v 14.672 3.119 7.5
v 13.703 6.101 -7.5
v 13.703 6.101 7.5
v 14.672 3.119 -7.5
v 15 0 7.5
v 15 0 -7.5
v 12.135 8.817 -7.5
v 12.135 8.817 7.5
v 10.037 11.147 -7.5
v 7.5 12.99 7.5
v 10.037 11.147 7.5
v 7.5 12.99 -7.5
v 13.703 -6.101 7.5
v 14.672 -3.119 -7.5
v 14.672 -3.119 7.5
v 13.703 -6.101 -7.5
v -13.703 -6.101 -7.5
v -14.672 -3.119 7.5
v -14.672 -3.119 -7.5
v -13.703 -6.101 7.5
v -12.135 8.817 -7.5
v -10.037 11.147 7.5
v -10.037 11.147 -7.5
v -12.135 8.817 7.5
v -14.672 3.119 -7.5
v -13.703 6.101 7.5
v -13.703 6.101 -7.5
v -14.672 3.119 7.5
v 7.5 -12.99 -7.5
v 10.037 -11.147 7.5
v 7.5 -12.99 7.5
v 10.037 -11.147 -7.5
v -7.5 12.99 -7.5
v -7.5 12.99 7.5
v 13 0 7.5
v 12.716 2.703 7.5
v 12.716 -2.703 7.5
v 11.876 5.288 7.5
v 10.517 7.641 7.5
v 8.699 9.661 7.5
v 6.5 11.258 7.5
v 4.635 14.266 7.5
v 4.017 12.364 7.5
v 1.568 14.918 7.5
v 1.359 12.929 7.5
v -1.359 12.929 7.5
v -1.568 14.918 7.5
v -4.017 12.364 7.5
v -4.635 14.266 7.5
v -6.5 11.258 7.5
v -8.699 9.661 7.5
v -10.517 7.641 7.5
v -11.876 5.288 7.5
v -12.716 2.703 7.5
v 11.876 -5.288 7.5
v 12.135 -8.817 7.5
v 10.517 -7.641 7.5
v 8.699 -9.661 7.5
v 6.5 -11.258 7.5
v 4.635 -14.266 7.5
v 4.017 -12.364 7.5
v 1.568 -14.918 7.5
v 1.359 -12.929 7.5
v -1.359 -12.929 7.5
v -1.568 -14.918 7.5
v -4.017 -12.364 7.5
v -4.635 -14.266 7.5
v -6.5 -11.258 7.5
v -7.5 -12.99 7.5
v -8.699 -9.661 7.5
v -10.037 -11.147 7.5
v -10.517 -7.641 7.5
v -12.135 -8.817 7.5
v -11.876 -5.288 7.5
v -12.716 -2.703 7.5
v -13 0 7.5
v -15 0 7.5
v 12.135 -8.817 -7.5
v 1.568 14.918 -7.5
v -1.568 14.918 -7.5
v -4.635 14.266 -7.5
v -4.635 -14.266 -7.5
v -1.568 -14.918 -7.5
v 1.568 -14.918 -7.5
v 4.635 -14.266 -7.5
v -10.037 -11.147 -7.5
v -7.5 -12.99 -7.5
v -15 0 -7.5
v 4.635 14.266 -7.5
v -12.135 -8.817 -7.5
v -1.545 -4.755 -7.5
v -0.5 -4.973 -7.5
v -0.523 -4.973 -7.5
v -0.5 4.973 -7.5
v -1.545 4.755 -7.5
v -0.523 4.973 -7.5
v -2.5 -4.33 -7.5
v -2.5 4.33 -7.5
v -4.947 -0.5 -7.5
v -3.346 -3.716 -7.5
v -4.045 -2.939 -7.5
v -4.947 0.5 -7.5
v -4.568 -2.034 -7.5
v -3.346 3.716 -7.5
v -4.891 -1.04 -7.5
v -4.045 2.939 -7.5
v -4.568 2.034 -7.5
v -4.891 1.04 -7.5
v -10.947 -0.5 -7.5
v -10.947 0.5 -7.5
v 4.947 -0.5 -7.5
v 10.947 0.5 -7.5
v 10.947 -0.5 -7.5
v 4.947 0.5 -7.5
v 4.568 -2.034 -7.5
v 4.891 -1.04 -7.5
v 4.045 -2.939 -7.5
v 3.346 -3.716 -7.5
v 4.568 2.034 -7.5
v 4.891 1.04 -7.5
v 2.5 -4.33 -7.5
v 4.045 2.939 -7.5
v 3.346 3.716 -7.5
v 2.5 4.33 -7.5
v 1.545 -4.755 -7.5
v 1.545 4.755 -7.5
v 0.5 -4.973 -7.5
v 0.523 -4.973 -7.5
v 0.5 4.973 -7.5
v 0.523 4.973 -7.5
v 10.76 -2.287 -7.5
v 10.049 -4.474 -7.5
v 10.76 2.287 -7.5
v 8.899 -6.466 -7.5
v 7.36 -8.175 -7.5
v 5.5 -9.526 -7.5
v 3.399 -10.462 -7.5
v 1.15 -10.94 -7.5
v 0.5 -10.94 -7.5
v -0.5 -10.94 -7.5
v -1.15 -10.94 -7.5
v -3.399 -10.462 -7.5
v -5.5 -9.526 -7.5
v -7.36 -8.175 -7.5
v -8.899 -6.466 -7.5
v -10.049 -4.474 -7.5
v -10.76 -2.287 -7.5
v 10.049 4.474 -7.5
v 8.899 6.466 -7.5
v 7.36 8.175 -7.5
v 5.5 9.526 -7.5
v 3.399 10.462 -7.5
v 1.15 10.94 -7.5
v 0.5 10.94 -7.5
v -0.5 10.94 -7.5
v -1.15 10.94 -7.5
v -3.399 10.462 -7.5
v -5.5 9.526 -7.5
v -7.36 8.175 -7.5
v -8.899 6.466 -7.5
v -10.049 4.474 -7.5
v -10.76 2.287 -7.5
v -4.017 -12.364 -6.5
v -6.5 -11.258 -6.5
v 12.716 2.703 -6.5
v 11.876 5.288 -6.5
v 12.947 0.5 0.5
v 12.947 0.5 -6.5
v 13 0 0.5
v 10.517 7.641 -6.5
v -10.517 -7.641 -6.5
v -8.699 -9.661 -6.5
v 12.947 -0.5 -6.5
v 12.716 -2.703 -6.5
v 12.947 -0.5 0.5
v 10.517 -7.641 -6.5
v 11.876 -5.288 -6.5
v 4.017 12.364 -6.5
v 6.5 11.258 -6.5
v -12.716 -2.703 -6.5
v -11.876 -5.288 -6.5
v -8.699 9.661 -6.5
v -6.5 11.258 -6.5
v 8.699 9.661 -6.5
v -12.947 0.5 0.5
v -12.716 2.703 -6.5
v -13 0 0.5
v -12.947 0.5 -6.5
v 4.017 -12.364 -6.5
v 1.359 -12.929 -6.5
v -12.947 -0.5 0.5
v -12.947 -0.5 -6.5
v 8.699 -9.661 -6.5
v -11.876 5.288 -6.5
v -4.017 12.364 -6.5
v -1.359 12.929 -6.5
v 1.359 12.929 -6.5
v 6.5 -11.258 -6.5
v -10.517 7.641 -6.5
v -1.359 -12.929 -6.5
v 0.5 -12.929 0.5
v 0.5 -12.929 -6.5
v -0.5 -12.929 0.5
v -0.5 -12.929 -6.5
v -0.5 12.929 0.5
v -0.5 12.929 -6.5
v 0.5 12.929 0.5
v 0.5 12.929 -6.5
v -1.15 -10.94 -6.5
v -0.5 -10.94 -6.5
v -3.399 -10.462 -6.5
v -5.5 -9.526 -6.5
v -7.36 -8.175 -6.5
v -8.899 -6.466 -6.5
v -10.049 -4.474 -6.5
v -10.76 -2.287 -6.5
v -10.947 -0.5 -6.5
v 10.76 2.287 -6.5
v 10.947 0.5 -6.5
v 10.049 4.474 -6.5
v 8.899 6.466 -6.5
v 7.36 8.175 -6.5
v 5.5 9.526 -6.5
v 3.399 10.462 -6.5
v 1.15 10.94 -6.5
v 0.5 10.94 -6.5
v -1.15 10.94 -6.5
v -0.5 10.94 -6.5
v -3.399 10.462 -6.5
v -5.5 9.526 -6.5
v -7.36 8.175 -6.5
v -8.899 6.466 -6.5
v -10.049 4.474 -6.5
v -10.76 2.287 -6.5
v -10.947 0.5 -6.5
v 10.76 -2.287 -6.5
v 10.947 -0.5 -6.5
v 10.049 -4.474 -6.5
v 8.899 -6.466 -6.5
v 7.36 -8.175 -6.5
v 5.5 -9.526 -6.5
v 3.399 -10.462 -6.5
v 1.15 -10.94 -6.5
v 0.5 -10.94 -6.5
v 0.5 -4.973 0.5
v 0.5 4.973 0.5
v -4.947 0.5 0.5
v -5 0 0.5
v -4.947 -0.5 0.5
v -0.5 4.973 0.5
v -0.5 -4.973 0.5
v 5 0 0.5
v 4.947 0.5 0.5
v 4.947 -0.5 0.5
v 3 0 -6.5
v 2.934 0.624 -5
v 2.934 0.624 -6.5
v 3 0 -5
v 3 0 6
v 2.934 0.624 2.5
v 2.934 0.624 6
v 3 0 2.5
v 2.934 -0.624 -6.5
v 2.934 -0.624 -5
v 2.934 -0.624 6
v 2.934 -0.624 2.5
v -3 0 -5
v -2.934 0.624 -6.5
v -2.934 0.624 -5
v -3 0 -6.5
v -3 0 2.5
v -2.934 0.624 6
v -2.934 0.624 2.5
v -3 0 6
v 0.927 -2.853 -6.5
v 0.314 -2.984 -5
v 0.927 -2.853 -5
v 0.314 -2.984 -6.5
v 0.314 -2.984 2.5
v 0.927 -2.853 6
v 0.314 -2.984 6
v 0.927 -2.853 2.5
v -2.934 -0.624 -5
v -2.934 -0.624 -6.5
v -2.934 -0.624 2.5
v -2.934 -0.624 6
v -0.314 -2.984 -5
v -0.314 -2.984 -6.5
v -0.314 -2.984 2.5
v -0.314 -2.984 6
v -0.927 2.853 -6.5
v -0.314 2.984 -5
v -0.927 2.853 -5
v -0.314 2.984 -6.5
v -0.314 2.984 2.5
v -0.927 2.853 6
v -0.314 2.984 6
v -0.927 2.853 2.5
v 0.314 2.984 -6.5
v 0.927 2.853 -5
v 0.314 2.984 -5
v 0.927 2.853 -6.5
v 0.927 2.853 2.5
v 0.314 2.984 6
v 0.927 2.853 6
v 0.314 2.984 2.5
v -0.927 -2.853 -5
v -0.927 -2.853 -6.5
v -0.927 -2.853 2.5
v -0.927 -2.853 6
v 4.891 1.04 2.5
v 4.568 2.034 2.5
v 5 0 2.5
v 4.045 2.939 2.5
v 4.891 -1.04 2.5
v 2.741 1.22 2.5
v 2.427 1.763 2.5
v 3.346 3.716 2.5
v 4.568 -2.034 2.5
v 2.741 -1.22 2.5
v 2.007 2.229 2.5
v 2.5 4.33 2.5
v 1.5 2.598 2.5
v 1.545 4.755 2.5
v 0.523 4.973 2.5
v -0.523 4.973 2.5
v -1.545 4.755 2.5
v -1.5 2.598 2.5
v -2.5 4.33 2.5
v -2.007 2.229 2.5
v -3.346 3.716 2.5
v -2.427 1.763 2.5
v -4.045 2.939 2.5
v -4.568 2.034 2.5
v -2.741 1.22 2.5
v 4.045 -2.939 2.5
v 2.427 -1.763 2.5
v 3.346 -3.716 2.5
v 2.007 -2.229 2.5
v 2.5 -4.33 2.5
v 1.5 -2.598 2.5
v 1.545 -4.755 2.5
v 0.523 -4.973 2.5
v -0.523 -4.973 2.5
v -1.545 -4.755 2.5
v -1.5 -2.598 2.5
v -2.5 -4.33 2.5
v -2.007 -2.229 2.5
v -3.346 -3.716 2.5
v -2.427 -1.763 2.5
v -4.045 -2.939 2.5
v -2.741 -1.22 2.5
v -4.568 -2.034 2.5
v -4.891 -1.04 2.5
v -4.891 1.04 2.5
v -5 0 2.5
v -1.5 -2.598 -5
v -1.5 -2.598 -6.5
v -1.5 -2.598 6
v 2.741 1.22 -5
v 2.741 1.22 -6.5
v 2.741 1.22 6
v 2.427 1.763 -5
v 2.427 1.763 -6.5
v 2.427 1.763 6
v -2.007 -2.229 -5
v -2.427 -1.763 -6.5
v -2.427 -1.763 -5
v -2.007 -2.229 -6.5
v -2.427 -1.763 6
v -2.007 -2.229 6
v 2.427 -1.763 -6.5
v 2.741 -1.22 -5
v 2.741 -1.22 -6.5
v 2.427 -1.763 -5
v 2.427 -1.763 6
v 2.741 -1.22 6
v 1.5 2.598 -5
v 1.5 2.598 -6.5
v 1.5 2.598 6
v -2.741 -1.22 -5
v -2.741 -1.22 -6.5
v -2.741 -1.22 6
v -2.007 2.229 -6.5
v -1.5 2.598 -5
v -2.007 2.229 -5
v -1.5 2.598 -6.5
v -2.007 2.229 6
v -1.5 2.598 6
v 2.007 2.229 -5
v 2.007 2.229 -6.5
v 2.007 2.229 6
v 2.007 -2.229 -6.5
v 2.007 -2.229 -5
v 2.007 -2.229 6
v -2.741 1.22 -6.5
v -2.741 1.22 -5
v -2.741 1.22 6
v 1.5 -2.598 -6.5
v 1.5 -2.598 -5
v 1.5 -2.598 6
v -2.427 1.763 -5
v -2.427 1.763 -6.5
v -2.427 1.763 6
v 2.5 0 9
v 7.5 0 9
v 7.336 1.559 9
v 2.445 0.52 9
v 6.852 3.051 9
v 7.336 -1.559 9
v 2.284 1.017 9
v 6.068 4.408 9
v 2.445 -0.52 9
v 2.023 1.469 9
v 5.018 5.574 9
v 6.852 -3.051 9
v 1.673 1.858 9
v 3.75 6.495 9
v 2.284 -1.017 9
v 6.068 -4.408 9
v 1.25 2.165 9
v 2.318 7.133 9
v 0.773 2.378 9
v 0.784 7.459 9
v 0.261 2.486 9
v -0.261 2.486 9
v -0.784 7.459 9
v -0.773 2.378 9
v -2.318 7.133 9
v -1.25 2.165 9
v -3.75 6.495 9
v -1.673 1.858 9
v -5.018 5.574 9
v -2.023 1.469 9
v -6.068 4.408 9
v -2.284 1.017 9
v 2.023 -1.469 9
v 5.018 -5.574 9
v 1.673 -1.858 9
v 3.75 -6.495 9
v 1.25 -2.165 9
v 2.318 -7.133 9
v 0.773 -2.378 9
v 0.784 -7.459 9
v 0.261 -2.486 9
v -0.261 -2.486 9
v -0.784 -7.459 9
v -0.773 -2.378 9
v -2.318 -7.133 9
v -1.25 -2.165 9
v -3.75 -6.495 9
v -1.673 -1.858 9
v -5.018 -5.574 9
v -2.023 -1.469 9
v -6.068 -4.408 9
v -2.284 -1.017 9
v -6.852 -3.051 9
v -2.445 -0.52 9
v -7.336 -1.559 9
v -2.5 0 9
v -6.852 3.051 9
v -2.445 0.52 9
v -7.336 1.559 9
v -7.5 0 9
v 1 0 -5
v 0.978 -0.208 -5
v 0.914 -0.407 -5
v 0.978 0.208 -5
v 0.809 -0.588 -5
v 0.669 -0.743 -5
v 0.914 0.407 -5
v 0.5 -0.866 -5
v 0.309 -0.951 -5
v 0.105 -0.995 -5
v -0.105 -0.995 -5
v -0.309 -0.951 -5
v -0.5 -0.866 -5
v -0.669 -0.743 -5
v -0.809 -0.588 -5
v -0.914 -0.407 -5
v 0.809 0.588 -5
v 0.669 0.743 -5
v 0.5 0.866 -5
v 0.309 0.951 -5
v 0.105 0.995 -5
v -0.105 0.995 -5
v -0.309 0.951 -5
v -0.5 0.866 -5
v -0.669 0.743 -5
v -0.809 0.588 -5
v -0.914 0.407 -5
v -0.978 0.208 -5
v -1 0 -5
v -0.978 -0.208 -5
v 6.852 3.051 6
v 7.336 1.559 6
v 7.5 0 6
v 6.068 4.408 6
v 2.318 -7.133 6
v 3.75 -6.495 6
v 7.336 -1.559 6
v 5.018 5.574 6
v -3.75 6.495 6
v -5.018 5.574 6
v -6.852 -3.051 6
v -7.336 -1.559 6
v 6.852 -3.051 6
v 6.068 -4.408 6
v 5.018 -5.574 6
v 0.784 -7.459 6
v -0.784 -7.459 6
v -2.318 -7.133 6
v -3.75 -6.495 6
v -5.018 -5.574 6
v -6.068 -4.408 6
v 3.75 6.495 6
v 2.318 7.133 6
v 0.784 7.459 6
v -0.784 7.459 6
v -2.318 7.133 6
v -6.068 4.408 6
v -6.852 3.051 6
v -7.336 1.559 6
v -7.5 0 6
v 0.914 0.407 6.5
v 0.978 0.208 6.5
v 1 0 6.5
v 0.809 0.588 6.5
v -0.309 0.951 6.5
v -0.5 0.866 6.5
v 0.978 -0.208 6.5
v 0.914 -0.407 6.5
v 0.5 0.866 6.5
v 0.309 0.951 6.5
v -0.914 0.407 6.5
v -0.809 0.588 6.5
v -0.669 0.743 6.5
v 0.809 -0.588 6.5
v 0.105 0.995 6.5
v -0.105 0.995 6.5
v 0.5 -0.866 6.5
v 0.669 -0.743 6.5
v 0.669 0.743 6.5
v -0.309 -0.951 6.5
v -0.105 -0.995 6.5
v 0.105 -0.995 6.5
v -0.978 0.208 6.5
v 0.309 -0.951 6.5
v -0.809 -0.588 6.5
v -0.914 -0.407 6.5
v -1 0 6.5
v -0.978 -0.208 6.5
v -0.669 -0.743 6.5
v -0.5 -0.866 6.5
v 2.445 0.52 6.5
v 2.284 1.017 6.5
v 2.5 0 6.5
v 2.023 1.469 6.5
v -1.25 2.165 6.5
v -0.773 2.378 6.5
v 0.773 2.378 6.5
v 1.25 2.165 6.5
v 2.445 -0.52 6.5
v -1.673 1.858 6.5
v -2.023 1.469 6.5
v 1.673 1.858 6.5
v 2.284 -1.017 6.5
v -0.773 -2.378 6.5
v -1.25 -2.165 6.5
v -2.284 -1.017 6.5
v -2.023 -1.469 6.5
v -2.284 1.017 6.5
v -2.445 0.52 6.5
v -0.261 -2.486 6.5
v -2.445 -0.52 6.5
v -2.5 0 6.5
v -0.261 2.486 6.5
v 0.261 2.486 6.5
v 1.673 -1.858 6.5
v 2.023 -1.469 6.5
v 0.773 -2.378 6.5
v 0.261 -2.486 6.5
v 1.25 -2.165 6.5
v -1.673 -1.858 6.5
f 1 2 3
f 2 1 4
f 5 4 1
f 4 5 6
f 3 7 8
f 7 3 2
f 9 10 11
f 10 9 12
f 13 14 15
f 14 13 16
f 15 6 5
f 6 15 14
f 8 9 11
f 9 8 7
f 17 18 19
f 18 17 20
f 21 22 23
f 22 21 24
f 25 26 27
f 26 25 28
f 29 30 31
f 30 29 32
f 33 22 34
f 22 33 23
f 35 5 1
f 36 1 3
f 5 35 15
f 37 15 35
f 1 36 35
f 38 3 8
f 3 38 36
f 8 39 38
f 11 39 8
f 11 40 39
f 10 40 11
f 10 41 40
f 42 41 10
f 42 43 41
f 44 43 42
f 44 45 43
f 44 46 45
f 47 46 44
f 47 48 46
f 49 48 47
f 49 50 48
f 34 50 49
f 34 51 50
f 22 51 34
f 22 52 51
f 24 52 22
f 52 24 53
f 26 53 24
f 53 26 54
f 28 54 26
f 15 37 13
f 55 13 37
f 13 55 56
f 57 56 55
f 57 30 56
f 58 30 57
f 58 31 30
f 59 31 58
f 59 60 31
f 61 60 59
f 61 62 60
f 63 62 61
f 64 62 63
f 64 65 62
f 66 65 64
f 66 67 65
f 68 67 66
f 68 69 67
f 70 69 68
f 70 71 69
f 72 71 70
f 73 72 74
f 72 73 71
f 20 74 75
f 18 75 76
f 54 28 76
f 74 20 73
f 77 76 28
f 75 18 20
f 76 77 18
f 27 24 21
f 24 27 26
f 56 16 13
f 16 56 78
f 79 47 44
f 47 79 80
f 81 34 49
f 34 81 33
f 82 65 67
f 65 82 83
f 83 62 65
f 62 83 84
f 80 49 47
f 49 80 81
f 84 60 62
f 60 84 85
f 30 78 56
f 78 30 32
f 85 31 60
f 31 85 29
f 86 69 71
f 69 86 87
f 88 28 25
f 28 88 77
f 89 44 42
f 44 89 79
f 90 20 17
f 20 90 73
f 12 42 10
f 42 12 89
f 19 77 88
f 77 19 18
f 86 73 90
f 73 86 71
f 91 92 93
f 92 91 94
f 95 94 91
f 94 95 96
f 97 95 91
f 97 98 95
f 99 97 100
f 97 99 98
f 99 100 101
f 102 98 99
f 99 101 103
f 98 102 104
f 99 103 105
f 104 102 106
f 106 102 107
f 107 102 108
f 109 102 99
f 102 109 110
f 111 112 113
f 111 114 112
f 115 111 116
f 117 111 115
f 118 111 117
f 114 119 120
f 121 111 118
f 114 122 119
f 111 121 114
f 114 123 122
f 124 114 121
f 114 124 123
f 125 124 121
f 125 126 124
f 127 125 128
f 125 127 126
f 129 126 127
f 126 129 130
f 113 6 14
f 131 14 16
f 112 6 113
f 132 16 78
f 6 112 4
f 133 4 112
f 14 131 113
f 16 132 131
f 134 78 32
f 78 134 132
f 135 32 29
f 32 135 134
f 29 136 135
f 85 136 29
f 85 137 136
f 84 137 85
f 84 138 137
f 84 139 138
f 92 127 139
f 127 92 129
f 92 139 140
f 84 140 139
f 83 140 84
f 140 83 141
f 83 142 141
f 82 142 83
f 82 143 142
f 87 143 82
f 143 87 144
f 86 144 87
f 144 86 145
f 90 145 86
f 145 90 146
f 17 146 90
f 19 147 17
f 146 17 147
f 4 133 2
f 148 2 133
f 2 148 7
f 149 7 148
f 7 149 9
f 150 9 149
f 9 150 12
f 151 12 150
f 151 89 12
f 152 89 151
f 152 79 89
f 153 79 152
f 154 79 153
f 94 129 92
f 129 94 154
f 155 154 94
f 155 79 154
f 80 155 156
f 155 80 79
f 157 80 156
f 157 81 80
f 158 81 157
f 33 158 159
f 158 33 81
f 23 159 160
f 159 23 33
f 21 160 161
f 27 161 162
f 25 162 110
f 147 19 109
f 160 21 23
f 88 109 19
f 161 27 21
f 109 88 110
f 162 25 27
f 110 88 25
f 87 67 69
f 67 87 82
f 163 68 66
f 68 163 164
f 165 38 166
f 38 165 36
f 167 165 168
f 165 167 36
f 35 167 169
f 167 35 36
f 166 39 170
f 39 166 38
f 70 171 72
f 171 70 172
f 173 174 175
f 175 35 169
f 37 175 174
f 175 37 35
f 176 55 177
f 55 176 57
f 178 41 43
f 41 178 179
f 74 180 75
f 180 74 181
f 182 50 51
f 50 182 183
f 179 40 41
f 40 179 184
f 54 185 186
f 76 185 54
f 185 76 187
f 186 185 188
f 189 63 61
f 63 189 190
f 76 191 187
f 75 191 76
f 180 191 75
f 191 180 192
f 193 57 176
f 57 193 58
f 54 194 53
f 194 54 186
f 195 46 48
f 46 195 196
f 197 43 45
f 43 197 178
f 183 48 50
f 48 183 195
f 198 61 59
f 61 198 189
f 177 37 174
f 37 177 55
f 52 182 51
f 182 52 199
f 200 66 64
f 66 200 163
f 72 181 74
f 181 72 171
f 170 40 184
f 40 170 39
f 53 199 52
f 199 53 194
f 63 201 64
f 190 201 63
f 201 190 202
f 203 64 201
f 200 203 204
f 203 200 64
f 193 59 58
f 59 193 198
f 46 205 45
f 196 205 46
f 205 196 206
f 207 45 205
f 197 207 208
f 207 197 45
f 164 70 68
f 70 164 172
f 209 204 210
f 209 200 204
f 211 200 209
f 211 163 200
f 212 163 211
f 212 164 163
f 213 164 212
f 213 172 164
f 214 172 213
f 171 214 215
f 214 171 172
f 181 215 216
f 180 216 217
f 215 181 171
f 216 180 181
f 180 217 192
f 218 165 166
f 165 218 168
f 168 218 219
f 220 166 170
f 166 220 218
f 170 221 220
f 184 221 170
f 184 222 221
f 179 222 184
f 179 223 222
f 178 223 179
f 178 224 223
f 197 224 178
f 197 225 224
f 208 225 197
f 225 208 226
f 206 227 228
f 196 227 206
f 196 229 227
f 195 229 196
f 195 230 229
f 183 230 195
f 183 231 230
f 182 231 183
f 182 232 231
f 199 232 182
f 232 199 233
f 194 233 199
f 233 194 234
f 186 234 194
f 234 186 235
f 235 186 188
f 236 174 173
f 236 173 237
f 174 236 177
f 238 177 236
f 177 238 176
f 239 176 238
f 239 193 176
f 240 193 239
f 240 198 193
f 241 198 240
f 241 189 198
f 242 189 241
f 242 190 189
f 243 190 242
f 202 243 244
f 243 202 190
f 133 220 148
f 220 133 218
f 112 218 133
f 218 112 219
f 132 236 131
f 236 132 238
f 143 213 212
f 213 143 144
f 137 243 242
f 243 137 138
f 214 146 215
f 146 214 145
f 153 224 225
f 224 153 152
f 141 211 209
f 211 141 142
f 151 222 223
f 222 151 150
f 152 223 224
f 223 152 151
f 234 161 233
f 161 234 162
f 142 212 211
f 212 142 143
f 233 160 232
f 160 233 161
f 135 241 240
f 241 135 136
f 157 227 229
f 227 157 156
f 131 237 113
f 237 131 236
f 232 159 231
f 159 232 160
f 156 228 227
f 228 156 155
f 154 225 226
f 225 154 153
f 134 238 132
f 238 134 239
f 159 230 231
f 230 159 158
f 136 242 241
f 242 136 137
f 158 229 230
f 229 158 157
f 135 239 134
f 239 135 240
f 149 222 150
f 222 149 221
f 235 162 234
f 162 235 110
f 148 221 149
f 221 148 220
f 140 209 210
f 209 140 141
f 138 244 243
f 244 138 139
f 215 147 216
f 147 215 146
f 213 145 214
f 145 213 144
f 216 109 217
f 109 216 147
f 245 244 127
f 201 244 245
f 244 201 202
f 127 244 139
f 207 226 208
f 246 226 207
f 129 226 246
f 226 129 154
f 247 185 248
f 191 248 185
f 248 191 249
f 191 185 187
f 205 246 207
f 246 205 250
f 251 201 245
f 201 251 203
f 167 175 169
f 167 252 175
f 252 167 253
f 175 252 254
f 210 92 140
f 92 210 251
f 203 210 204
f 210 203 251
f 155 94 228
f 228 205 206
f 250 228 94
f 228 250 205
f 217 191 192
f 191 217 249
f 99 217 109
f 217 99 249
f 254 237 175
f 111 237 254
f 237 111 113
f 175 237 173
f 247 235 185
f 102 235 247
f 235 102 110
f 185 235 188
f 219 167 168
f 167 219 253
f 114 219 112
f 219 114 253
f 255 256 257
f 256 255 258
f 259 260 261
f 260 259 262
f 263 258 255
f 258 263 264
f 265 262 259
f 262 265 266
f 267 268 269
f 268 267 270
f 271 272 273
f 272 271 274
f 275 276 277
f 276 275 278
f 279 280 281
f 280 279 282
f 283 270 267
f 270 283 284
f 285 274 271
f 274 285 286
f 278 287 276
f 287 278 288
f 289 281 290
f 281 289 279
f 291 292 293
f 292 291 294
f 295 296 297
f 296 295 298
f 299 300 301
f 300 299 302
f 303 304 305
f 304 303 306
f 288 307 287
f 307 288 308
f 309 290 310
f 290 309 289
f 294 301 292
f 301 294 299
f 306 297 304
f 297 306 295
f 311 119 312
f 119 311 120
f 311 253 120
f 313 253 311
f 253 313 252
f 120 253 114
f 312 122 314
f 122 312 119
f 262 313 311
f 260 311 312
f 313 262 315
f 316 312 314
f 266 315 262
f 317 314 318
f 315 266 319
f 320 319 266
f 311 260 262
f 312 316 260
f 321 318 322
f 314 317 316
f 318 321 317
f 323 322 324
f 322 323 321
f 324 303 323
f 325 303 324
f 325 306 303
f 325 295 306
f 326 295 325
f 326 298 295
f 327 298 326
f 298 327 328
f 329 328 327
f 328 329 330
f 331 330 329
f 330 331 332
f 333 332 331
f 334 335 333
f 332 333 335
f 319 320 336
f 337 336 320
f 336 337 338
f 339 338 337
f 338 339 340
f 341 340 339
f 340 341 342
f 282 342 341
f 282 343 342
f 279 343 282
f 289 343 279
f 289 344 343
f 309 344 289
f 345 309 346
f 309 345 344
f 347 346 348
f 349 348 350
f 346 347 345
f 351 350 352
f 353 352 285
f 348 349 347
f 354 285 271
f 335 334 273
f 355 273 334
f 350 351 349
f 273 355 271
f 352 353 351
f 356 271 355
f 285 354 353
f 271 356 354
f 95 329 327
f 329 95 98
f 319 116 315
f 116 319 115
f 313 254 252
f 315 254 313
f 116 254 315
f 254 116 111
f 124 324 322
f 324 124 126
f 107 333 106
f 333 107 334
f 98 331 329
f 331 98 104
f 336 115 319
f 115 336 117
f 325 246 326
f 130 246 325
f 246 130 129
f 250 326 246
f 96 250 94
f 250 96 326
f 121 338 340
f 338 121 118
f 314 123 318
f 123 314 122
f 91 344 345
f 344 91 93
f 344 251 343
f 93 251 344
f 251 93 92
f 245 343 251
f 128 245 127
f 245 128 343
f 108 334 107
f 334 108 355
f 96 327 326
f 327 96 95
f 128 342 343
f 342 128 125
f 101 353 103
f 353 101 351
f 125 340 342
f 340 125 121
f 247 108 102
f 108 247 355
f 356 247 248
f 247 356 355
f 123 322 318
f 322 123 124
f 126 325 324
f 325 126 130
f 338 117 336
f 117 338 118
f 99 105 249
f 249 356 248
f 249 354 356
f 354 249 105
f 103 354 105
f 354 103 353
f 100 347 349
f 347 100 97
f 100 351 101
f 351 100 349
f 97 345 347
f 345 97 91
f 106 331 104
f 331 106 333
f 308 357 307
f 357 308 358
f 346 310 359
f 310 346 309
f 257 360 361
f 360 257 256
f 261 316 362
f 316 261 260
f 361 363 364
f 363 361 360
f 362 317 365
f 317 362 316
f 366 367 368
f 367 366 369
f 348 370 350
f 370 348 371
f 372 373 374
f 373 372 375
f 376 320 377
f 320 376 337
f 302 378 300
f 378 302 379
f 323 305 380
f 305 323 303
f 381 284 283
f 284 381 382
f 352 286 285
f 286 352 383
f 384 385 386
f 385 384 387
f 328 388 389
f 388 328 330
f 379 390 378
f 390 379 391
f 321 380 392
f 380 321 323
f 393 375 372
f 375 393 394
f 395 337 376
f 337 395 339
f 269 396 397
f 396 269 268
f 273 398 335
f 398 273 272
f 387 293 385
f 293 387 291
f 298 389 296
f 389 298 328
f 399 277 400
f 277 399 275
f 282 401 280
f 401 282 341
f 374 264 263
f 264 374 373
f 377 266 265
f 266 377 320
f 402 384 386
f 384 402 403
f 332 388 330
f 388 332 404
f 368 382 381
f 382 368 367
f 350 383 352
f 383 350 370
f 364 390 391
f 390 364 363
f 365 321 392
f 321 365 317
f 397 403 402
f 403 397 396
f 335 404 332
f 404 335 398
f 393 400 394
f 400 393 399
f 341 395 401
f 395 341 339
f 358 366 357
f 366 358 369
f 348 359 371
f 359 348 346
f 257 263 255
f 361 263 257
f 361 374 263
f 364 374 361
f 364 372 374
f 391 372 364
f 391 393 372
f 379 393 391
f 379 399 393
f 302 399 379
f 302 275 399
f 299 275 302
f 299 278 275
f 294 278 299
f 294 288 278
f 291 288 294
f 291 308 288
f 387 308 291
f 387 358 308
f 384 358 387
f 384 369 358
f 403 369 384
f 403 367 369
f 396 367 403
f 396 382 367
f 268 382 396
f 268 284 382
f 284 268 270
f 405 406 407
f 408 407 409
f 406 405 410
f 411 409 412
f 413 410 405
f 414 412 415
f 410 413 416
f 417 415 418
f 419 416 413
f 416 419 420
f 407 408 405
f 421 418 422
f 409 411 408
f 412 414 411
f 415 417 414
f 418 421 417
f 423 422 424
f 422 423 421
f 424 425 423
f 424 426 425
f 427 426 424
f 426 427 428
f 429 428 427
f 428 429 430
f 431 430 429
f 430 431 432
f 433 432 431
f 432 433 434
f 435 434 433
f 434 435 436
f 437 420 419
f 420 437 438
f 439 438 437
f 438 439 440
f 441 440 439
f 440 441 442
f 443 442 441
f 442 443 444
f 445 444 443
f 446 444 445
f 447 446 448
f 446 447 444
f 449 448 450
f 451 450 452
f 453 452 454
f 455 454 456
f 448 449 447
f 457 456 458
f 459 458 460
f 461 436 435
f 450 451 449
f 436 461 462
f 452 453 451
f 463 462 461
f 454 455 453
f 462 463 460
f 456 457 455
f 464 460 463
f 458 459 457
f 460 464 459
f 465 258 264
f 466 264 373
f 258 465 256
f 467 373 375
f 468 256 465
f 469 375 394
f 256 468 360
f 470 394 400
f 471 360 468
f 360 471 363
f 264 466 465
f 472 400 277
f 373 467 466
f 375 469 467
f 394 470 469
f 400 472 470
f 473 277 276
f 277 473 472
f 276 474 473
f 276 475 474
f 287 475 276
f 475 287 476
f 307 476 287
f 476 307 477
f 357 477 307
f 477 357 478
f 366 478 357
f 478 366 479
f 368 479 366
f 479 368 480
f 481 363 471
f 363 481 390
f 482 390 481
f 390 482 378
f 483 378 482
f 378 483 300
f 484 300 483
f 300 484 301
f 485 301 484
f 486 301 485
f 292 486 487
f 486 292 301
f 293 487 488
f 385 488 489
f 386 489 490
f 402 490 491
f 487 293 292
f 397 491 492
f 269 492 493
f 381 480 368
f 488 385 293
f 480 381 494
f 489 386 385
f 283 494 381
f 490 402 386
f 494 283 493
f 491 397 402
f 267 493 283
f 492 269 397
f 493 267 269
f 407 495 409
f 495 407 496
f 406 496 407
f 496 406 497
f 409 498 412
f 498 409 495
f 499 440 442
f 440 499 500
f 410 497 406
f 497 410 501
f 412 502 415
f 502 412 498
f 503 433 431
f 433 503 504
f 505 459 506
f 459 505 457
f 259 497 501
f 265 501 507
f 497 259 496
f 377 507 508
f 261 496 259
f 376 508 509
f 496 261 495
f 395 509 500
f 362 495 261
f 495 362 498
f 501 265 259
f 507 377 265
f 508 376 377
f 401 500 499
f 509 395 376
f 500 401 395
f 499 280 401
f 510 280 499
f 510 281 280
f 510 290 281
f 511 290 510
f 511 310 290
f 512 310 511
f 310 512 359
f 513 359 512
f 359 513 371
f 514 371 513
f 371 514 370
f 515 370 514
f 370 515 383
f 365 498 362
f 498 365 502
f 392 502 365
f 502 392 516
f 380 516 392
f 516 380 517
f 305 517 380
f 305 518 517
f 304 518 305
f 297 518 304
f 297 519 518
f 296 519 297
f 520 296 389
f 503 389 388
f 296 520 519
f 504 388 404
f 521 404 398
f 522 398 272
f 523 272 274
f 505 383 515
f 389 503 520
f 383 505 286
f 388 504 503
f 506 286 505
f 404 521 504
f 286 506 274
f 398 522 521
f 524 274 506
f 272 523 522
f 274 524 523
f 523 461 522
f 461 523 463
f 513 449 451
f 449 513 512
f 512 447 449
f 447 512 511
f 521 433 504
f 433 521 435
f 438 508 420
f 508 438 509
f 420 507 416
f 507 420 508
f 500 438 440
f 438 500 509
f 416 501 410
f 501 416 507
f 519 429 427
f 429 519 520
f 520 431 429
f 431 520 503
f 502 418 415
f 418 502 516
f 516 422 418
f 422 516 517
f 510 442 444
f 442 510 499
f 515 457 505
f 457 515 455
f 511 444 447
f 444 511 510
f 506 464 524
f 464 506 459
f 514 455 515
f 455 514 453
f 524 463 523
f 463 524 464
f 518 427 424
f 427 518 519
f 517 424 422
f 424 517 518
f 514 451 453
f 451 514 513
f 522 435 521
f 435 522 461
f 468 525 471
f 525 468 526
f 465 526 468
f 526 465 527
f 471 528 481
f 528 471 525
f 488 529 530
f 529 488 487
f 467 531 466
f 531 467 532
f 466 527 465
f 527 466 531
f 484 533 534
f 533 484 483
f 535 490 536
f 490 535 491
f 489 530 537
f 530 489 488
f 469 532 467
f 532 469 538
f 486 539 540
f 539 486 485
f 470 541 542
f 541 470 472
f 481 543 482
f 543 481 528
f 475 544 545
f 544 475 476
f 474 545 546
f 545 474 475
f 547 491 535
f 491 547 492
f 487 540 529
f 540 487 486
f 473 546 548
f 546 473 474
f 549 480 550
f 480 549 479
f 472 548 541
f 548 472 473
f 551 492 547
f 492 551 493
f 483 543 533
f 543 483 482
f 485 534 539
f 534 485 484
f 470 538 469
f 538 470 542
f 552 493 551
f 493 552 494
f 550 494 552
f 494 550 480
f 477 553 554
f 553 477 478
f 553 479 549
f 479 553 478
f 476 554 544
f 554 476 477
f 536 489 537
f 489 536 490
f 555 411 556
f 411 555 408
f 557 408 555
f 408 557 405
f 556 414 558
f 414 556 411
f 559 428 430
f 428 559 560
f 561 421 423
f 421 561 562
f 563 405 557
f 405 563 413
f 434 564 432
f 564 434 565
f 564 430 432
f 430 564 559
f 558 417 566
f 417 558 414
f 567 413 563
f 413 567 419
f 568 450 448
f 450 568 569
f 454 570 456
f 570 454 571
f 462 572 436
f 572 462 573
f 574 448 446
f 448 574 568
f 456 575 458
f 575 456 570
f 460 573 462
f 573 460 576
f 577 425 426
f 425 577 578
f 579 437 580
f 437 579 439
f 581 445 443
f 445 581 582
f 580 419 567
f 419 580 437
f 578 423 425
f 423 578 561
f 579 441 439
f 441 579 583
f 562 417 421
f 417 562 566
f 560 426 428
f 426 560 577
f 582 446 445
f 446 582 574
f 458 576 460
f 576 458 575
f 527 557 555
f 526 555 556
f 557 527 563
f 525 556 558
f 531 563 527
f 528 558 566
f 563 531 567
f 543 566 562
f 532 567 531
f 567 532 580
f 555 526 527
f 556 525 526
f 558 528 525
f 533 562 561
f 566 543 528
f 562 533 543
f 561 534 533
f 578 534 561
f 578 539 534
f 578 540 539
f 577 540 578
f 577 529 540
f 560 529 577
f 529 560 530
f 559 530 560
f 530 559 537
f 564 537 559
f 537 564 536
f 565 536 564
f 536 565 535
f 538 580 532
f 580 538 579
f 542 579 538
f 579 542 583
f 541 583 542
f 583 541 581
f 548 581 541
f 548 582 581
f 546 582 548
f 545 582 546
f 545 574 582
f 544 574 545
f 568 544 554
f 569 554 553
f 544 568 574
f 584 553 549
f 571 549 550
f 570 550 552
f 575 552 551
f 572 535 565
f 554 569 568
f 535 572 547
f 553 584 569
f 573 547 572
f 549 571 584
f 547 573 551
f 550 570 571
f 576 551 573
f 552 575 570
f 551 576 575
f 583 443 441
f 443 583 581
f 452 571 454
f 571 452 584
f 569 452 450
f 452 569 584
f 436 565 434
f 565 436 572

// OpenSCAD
//////////////////////////////////////////////
// PC Standfuss
//////////////////////////////////////////////
$fn=30;

Fuss = true;
Befestigung = true;


if (Fuss) Fuss();

if (Befestigung) Befestigung();
    
module Fuss() {
    difference() {
        cylinder(d=30,h=15,center=true);
        translate([0,0,1])
        cylinder(d=26,h=15,center=true);
        translate([0,0,-1])
        cylinder(d=22,h=15,center=true);
    }
    
    difference() {
        union() {
            translate([0,0,-3.5])
            cube([1,29,8],center=true);
            translate([0,0,-3.5]) rotate([0,0,90])
            cube([1,29,8],center=true);
        }
       translate([0,0,-1])
       cylinder(d=6,h=15,center=true);
    }
    difference() {
        translate([0,0,-2.5])
        cylinder(d=10,h=10,center=true);
        translate([0,0,-1.5])
        cylinder(d=6,h=10,center=true);
    }
}

    
module Befestigung() {
    
    difference() {
        union() {
           translate([0,0,2])
           cylinder(d=6,h=14,center=true);
           translate([0,0,7.5])
           cylinder(d=15,h=3,center=true);
        }
        cylinder(d=2,h=30,center=true);
        translate([0,0,9])
        cylinder(d=5,h=5,center=true);
     }

}
